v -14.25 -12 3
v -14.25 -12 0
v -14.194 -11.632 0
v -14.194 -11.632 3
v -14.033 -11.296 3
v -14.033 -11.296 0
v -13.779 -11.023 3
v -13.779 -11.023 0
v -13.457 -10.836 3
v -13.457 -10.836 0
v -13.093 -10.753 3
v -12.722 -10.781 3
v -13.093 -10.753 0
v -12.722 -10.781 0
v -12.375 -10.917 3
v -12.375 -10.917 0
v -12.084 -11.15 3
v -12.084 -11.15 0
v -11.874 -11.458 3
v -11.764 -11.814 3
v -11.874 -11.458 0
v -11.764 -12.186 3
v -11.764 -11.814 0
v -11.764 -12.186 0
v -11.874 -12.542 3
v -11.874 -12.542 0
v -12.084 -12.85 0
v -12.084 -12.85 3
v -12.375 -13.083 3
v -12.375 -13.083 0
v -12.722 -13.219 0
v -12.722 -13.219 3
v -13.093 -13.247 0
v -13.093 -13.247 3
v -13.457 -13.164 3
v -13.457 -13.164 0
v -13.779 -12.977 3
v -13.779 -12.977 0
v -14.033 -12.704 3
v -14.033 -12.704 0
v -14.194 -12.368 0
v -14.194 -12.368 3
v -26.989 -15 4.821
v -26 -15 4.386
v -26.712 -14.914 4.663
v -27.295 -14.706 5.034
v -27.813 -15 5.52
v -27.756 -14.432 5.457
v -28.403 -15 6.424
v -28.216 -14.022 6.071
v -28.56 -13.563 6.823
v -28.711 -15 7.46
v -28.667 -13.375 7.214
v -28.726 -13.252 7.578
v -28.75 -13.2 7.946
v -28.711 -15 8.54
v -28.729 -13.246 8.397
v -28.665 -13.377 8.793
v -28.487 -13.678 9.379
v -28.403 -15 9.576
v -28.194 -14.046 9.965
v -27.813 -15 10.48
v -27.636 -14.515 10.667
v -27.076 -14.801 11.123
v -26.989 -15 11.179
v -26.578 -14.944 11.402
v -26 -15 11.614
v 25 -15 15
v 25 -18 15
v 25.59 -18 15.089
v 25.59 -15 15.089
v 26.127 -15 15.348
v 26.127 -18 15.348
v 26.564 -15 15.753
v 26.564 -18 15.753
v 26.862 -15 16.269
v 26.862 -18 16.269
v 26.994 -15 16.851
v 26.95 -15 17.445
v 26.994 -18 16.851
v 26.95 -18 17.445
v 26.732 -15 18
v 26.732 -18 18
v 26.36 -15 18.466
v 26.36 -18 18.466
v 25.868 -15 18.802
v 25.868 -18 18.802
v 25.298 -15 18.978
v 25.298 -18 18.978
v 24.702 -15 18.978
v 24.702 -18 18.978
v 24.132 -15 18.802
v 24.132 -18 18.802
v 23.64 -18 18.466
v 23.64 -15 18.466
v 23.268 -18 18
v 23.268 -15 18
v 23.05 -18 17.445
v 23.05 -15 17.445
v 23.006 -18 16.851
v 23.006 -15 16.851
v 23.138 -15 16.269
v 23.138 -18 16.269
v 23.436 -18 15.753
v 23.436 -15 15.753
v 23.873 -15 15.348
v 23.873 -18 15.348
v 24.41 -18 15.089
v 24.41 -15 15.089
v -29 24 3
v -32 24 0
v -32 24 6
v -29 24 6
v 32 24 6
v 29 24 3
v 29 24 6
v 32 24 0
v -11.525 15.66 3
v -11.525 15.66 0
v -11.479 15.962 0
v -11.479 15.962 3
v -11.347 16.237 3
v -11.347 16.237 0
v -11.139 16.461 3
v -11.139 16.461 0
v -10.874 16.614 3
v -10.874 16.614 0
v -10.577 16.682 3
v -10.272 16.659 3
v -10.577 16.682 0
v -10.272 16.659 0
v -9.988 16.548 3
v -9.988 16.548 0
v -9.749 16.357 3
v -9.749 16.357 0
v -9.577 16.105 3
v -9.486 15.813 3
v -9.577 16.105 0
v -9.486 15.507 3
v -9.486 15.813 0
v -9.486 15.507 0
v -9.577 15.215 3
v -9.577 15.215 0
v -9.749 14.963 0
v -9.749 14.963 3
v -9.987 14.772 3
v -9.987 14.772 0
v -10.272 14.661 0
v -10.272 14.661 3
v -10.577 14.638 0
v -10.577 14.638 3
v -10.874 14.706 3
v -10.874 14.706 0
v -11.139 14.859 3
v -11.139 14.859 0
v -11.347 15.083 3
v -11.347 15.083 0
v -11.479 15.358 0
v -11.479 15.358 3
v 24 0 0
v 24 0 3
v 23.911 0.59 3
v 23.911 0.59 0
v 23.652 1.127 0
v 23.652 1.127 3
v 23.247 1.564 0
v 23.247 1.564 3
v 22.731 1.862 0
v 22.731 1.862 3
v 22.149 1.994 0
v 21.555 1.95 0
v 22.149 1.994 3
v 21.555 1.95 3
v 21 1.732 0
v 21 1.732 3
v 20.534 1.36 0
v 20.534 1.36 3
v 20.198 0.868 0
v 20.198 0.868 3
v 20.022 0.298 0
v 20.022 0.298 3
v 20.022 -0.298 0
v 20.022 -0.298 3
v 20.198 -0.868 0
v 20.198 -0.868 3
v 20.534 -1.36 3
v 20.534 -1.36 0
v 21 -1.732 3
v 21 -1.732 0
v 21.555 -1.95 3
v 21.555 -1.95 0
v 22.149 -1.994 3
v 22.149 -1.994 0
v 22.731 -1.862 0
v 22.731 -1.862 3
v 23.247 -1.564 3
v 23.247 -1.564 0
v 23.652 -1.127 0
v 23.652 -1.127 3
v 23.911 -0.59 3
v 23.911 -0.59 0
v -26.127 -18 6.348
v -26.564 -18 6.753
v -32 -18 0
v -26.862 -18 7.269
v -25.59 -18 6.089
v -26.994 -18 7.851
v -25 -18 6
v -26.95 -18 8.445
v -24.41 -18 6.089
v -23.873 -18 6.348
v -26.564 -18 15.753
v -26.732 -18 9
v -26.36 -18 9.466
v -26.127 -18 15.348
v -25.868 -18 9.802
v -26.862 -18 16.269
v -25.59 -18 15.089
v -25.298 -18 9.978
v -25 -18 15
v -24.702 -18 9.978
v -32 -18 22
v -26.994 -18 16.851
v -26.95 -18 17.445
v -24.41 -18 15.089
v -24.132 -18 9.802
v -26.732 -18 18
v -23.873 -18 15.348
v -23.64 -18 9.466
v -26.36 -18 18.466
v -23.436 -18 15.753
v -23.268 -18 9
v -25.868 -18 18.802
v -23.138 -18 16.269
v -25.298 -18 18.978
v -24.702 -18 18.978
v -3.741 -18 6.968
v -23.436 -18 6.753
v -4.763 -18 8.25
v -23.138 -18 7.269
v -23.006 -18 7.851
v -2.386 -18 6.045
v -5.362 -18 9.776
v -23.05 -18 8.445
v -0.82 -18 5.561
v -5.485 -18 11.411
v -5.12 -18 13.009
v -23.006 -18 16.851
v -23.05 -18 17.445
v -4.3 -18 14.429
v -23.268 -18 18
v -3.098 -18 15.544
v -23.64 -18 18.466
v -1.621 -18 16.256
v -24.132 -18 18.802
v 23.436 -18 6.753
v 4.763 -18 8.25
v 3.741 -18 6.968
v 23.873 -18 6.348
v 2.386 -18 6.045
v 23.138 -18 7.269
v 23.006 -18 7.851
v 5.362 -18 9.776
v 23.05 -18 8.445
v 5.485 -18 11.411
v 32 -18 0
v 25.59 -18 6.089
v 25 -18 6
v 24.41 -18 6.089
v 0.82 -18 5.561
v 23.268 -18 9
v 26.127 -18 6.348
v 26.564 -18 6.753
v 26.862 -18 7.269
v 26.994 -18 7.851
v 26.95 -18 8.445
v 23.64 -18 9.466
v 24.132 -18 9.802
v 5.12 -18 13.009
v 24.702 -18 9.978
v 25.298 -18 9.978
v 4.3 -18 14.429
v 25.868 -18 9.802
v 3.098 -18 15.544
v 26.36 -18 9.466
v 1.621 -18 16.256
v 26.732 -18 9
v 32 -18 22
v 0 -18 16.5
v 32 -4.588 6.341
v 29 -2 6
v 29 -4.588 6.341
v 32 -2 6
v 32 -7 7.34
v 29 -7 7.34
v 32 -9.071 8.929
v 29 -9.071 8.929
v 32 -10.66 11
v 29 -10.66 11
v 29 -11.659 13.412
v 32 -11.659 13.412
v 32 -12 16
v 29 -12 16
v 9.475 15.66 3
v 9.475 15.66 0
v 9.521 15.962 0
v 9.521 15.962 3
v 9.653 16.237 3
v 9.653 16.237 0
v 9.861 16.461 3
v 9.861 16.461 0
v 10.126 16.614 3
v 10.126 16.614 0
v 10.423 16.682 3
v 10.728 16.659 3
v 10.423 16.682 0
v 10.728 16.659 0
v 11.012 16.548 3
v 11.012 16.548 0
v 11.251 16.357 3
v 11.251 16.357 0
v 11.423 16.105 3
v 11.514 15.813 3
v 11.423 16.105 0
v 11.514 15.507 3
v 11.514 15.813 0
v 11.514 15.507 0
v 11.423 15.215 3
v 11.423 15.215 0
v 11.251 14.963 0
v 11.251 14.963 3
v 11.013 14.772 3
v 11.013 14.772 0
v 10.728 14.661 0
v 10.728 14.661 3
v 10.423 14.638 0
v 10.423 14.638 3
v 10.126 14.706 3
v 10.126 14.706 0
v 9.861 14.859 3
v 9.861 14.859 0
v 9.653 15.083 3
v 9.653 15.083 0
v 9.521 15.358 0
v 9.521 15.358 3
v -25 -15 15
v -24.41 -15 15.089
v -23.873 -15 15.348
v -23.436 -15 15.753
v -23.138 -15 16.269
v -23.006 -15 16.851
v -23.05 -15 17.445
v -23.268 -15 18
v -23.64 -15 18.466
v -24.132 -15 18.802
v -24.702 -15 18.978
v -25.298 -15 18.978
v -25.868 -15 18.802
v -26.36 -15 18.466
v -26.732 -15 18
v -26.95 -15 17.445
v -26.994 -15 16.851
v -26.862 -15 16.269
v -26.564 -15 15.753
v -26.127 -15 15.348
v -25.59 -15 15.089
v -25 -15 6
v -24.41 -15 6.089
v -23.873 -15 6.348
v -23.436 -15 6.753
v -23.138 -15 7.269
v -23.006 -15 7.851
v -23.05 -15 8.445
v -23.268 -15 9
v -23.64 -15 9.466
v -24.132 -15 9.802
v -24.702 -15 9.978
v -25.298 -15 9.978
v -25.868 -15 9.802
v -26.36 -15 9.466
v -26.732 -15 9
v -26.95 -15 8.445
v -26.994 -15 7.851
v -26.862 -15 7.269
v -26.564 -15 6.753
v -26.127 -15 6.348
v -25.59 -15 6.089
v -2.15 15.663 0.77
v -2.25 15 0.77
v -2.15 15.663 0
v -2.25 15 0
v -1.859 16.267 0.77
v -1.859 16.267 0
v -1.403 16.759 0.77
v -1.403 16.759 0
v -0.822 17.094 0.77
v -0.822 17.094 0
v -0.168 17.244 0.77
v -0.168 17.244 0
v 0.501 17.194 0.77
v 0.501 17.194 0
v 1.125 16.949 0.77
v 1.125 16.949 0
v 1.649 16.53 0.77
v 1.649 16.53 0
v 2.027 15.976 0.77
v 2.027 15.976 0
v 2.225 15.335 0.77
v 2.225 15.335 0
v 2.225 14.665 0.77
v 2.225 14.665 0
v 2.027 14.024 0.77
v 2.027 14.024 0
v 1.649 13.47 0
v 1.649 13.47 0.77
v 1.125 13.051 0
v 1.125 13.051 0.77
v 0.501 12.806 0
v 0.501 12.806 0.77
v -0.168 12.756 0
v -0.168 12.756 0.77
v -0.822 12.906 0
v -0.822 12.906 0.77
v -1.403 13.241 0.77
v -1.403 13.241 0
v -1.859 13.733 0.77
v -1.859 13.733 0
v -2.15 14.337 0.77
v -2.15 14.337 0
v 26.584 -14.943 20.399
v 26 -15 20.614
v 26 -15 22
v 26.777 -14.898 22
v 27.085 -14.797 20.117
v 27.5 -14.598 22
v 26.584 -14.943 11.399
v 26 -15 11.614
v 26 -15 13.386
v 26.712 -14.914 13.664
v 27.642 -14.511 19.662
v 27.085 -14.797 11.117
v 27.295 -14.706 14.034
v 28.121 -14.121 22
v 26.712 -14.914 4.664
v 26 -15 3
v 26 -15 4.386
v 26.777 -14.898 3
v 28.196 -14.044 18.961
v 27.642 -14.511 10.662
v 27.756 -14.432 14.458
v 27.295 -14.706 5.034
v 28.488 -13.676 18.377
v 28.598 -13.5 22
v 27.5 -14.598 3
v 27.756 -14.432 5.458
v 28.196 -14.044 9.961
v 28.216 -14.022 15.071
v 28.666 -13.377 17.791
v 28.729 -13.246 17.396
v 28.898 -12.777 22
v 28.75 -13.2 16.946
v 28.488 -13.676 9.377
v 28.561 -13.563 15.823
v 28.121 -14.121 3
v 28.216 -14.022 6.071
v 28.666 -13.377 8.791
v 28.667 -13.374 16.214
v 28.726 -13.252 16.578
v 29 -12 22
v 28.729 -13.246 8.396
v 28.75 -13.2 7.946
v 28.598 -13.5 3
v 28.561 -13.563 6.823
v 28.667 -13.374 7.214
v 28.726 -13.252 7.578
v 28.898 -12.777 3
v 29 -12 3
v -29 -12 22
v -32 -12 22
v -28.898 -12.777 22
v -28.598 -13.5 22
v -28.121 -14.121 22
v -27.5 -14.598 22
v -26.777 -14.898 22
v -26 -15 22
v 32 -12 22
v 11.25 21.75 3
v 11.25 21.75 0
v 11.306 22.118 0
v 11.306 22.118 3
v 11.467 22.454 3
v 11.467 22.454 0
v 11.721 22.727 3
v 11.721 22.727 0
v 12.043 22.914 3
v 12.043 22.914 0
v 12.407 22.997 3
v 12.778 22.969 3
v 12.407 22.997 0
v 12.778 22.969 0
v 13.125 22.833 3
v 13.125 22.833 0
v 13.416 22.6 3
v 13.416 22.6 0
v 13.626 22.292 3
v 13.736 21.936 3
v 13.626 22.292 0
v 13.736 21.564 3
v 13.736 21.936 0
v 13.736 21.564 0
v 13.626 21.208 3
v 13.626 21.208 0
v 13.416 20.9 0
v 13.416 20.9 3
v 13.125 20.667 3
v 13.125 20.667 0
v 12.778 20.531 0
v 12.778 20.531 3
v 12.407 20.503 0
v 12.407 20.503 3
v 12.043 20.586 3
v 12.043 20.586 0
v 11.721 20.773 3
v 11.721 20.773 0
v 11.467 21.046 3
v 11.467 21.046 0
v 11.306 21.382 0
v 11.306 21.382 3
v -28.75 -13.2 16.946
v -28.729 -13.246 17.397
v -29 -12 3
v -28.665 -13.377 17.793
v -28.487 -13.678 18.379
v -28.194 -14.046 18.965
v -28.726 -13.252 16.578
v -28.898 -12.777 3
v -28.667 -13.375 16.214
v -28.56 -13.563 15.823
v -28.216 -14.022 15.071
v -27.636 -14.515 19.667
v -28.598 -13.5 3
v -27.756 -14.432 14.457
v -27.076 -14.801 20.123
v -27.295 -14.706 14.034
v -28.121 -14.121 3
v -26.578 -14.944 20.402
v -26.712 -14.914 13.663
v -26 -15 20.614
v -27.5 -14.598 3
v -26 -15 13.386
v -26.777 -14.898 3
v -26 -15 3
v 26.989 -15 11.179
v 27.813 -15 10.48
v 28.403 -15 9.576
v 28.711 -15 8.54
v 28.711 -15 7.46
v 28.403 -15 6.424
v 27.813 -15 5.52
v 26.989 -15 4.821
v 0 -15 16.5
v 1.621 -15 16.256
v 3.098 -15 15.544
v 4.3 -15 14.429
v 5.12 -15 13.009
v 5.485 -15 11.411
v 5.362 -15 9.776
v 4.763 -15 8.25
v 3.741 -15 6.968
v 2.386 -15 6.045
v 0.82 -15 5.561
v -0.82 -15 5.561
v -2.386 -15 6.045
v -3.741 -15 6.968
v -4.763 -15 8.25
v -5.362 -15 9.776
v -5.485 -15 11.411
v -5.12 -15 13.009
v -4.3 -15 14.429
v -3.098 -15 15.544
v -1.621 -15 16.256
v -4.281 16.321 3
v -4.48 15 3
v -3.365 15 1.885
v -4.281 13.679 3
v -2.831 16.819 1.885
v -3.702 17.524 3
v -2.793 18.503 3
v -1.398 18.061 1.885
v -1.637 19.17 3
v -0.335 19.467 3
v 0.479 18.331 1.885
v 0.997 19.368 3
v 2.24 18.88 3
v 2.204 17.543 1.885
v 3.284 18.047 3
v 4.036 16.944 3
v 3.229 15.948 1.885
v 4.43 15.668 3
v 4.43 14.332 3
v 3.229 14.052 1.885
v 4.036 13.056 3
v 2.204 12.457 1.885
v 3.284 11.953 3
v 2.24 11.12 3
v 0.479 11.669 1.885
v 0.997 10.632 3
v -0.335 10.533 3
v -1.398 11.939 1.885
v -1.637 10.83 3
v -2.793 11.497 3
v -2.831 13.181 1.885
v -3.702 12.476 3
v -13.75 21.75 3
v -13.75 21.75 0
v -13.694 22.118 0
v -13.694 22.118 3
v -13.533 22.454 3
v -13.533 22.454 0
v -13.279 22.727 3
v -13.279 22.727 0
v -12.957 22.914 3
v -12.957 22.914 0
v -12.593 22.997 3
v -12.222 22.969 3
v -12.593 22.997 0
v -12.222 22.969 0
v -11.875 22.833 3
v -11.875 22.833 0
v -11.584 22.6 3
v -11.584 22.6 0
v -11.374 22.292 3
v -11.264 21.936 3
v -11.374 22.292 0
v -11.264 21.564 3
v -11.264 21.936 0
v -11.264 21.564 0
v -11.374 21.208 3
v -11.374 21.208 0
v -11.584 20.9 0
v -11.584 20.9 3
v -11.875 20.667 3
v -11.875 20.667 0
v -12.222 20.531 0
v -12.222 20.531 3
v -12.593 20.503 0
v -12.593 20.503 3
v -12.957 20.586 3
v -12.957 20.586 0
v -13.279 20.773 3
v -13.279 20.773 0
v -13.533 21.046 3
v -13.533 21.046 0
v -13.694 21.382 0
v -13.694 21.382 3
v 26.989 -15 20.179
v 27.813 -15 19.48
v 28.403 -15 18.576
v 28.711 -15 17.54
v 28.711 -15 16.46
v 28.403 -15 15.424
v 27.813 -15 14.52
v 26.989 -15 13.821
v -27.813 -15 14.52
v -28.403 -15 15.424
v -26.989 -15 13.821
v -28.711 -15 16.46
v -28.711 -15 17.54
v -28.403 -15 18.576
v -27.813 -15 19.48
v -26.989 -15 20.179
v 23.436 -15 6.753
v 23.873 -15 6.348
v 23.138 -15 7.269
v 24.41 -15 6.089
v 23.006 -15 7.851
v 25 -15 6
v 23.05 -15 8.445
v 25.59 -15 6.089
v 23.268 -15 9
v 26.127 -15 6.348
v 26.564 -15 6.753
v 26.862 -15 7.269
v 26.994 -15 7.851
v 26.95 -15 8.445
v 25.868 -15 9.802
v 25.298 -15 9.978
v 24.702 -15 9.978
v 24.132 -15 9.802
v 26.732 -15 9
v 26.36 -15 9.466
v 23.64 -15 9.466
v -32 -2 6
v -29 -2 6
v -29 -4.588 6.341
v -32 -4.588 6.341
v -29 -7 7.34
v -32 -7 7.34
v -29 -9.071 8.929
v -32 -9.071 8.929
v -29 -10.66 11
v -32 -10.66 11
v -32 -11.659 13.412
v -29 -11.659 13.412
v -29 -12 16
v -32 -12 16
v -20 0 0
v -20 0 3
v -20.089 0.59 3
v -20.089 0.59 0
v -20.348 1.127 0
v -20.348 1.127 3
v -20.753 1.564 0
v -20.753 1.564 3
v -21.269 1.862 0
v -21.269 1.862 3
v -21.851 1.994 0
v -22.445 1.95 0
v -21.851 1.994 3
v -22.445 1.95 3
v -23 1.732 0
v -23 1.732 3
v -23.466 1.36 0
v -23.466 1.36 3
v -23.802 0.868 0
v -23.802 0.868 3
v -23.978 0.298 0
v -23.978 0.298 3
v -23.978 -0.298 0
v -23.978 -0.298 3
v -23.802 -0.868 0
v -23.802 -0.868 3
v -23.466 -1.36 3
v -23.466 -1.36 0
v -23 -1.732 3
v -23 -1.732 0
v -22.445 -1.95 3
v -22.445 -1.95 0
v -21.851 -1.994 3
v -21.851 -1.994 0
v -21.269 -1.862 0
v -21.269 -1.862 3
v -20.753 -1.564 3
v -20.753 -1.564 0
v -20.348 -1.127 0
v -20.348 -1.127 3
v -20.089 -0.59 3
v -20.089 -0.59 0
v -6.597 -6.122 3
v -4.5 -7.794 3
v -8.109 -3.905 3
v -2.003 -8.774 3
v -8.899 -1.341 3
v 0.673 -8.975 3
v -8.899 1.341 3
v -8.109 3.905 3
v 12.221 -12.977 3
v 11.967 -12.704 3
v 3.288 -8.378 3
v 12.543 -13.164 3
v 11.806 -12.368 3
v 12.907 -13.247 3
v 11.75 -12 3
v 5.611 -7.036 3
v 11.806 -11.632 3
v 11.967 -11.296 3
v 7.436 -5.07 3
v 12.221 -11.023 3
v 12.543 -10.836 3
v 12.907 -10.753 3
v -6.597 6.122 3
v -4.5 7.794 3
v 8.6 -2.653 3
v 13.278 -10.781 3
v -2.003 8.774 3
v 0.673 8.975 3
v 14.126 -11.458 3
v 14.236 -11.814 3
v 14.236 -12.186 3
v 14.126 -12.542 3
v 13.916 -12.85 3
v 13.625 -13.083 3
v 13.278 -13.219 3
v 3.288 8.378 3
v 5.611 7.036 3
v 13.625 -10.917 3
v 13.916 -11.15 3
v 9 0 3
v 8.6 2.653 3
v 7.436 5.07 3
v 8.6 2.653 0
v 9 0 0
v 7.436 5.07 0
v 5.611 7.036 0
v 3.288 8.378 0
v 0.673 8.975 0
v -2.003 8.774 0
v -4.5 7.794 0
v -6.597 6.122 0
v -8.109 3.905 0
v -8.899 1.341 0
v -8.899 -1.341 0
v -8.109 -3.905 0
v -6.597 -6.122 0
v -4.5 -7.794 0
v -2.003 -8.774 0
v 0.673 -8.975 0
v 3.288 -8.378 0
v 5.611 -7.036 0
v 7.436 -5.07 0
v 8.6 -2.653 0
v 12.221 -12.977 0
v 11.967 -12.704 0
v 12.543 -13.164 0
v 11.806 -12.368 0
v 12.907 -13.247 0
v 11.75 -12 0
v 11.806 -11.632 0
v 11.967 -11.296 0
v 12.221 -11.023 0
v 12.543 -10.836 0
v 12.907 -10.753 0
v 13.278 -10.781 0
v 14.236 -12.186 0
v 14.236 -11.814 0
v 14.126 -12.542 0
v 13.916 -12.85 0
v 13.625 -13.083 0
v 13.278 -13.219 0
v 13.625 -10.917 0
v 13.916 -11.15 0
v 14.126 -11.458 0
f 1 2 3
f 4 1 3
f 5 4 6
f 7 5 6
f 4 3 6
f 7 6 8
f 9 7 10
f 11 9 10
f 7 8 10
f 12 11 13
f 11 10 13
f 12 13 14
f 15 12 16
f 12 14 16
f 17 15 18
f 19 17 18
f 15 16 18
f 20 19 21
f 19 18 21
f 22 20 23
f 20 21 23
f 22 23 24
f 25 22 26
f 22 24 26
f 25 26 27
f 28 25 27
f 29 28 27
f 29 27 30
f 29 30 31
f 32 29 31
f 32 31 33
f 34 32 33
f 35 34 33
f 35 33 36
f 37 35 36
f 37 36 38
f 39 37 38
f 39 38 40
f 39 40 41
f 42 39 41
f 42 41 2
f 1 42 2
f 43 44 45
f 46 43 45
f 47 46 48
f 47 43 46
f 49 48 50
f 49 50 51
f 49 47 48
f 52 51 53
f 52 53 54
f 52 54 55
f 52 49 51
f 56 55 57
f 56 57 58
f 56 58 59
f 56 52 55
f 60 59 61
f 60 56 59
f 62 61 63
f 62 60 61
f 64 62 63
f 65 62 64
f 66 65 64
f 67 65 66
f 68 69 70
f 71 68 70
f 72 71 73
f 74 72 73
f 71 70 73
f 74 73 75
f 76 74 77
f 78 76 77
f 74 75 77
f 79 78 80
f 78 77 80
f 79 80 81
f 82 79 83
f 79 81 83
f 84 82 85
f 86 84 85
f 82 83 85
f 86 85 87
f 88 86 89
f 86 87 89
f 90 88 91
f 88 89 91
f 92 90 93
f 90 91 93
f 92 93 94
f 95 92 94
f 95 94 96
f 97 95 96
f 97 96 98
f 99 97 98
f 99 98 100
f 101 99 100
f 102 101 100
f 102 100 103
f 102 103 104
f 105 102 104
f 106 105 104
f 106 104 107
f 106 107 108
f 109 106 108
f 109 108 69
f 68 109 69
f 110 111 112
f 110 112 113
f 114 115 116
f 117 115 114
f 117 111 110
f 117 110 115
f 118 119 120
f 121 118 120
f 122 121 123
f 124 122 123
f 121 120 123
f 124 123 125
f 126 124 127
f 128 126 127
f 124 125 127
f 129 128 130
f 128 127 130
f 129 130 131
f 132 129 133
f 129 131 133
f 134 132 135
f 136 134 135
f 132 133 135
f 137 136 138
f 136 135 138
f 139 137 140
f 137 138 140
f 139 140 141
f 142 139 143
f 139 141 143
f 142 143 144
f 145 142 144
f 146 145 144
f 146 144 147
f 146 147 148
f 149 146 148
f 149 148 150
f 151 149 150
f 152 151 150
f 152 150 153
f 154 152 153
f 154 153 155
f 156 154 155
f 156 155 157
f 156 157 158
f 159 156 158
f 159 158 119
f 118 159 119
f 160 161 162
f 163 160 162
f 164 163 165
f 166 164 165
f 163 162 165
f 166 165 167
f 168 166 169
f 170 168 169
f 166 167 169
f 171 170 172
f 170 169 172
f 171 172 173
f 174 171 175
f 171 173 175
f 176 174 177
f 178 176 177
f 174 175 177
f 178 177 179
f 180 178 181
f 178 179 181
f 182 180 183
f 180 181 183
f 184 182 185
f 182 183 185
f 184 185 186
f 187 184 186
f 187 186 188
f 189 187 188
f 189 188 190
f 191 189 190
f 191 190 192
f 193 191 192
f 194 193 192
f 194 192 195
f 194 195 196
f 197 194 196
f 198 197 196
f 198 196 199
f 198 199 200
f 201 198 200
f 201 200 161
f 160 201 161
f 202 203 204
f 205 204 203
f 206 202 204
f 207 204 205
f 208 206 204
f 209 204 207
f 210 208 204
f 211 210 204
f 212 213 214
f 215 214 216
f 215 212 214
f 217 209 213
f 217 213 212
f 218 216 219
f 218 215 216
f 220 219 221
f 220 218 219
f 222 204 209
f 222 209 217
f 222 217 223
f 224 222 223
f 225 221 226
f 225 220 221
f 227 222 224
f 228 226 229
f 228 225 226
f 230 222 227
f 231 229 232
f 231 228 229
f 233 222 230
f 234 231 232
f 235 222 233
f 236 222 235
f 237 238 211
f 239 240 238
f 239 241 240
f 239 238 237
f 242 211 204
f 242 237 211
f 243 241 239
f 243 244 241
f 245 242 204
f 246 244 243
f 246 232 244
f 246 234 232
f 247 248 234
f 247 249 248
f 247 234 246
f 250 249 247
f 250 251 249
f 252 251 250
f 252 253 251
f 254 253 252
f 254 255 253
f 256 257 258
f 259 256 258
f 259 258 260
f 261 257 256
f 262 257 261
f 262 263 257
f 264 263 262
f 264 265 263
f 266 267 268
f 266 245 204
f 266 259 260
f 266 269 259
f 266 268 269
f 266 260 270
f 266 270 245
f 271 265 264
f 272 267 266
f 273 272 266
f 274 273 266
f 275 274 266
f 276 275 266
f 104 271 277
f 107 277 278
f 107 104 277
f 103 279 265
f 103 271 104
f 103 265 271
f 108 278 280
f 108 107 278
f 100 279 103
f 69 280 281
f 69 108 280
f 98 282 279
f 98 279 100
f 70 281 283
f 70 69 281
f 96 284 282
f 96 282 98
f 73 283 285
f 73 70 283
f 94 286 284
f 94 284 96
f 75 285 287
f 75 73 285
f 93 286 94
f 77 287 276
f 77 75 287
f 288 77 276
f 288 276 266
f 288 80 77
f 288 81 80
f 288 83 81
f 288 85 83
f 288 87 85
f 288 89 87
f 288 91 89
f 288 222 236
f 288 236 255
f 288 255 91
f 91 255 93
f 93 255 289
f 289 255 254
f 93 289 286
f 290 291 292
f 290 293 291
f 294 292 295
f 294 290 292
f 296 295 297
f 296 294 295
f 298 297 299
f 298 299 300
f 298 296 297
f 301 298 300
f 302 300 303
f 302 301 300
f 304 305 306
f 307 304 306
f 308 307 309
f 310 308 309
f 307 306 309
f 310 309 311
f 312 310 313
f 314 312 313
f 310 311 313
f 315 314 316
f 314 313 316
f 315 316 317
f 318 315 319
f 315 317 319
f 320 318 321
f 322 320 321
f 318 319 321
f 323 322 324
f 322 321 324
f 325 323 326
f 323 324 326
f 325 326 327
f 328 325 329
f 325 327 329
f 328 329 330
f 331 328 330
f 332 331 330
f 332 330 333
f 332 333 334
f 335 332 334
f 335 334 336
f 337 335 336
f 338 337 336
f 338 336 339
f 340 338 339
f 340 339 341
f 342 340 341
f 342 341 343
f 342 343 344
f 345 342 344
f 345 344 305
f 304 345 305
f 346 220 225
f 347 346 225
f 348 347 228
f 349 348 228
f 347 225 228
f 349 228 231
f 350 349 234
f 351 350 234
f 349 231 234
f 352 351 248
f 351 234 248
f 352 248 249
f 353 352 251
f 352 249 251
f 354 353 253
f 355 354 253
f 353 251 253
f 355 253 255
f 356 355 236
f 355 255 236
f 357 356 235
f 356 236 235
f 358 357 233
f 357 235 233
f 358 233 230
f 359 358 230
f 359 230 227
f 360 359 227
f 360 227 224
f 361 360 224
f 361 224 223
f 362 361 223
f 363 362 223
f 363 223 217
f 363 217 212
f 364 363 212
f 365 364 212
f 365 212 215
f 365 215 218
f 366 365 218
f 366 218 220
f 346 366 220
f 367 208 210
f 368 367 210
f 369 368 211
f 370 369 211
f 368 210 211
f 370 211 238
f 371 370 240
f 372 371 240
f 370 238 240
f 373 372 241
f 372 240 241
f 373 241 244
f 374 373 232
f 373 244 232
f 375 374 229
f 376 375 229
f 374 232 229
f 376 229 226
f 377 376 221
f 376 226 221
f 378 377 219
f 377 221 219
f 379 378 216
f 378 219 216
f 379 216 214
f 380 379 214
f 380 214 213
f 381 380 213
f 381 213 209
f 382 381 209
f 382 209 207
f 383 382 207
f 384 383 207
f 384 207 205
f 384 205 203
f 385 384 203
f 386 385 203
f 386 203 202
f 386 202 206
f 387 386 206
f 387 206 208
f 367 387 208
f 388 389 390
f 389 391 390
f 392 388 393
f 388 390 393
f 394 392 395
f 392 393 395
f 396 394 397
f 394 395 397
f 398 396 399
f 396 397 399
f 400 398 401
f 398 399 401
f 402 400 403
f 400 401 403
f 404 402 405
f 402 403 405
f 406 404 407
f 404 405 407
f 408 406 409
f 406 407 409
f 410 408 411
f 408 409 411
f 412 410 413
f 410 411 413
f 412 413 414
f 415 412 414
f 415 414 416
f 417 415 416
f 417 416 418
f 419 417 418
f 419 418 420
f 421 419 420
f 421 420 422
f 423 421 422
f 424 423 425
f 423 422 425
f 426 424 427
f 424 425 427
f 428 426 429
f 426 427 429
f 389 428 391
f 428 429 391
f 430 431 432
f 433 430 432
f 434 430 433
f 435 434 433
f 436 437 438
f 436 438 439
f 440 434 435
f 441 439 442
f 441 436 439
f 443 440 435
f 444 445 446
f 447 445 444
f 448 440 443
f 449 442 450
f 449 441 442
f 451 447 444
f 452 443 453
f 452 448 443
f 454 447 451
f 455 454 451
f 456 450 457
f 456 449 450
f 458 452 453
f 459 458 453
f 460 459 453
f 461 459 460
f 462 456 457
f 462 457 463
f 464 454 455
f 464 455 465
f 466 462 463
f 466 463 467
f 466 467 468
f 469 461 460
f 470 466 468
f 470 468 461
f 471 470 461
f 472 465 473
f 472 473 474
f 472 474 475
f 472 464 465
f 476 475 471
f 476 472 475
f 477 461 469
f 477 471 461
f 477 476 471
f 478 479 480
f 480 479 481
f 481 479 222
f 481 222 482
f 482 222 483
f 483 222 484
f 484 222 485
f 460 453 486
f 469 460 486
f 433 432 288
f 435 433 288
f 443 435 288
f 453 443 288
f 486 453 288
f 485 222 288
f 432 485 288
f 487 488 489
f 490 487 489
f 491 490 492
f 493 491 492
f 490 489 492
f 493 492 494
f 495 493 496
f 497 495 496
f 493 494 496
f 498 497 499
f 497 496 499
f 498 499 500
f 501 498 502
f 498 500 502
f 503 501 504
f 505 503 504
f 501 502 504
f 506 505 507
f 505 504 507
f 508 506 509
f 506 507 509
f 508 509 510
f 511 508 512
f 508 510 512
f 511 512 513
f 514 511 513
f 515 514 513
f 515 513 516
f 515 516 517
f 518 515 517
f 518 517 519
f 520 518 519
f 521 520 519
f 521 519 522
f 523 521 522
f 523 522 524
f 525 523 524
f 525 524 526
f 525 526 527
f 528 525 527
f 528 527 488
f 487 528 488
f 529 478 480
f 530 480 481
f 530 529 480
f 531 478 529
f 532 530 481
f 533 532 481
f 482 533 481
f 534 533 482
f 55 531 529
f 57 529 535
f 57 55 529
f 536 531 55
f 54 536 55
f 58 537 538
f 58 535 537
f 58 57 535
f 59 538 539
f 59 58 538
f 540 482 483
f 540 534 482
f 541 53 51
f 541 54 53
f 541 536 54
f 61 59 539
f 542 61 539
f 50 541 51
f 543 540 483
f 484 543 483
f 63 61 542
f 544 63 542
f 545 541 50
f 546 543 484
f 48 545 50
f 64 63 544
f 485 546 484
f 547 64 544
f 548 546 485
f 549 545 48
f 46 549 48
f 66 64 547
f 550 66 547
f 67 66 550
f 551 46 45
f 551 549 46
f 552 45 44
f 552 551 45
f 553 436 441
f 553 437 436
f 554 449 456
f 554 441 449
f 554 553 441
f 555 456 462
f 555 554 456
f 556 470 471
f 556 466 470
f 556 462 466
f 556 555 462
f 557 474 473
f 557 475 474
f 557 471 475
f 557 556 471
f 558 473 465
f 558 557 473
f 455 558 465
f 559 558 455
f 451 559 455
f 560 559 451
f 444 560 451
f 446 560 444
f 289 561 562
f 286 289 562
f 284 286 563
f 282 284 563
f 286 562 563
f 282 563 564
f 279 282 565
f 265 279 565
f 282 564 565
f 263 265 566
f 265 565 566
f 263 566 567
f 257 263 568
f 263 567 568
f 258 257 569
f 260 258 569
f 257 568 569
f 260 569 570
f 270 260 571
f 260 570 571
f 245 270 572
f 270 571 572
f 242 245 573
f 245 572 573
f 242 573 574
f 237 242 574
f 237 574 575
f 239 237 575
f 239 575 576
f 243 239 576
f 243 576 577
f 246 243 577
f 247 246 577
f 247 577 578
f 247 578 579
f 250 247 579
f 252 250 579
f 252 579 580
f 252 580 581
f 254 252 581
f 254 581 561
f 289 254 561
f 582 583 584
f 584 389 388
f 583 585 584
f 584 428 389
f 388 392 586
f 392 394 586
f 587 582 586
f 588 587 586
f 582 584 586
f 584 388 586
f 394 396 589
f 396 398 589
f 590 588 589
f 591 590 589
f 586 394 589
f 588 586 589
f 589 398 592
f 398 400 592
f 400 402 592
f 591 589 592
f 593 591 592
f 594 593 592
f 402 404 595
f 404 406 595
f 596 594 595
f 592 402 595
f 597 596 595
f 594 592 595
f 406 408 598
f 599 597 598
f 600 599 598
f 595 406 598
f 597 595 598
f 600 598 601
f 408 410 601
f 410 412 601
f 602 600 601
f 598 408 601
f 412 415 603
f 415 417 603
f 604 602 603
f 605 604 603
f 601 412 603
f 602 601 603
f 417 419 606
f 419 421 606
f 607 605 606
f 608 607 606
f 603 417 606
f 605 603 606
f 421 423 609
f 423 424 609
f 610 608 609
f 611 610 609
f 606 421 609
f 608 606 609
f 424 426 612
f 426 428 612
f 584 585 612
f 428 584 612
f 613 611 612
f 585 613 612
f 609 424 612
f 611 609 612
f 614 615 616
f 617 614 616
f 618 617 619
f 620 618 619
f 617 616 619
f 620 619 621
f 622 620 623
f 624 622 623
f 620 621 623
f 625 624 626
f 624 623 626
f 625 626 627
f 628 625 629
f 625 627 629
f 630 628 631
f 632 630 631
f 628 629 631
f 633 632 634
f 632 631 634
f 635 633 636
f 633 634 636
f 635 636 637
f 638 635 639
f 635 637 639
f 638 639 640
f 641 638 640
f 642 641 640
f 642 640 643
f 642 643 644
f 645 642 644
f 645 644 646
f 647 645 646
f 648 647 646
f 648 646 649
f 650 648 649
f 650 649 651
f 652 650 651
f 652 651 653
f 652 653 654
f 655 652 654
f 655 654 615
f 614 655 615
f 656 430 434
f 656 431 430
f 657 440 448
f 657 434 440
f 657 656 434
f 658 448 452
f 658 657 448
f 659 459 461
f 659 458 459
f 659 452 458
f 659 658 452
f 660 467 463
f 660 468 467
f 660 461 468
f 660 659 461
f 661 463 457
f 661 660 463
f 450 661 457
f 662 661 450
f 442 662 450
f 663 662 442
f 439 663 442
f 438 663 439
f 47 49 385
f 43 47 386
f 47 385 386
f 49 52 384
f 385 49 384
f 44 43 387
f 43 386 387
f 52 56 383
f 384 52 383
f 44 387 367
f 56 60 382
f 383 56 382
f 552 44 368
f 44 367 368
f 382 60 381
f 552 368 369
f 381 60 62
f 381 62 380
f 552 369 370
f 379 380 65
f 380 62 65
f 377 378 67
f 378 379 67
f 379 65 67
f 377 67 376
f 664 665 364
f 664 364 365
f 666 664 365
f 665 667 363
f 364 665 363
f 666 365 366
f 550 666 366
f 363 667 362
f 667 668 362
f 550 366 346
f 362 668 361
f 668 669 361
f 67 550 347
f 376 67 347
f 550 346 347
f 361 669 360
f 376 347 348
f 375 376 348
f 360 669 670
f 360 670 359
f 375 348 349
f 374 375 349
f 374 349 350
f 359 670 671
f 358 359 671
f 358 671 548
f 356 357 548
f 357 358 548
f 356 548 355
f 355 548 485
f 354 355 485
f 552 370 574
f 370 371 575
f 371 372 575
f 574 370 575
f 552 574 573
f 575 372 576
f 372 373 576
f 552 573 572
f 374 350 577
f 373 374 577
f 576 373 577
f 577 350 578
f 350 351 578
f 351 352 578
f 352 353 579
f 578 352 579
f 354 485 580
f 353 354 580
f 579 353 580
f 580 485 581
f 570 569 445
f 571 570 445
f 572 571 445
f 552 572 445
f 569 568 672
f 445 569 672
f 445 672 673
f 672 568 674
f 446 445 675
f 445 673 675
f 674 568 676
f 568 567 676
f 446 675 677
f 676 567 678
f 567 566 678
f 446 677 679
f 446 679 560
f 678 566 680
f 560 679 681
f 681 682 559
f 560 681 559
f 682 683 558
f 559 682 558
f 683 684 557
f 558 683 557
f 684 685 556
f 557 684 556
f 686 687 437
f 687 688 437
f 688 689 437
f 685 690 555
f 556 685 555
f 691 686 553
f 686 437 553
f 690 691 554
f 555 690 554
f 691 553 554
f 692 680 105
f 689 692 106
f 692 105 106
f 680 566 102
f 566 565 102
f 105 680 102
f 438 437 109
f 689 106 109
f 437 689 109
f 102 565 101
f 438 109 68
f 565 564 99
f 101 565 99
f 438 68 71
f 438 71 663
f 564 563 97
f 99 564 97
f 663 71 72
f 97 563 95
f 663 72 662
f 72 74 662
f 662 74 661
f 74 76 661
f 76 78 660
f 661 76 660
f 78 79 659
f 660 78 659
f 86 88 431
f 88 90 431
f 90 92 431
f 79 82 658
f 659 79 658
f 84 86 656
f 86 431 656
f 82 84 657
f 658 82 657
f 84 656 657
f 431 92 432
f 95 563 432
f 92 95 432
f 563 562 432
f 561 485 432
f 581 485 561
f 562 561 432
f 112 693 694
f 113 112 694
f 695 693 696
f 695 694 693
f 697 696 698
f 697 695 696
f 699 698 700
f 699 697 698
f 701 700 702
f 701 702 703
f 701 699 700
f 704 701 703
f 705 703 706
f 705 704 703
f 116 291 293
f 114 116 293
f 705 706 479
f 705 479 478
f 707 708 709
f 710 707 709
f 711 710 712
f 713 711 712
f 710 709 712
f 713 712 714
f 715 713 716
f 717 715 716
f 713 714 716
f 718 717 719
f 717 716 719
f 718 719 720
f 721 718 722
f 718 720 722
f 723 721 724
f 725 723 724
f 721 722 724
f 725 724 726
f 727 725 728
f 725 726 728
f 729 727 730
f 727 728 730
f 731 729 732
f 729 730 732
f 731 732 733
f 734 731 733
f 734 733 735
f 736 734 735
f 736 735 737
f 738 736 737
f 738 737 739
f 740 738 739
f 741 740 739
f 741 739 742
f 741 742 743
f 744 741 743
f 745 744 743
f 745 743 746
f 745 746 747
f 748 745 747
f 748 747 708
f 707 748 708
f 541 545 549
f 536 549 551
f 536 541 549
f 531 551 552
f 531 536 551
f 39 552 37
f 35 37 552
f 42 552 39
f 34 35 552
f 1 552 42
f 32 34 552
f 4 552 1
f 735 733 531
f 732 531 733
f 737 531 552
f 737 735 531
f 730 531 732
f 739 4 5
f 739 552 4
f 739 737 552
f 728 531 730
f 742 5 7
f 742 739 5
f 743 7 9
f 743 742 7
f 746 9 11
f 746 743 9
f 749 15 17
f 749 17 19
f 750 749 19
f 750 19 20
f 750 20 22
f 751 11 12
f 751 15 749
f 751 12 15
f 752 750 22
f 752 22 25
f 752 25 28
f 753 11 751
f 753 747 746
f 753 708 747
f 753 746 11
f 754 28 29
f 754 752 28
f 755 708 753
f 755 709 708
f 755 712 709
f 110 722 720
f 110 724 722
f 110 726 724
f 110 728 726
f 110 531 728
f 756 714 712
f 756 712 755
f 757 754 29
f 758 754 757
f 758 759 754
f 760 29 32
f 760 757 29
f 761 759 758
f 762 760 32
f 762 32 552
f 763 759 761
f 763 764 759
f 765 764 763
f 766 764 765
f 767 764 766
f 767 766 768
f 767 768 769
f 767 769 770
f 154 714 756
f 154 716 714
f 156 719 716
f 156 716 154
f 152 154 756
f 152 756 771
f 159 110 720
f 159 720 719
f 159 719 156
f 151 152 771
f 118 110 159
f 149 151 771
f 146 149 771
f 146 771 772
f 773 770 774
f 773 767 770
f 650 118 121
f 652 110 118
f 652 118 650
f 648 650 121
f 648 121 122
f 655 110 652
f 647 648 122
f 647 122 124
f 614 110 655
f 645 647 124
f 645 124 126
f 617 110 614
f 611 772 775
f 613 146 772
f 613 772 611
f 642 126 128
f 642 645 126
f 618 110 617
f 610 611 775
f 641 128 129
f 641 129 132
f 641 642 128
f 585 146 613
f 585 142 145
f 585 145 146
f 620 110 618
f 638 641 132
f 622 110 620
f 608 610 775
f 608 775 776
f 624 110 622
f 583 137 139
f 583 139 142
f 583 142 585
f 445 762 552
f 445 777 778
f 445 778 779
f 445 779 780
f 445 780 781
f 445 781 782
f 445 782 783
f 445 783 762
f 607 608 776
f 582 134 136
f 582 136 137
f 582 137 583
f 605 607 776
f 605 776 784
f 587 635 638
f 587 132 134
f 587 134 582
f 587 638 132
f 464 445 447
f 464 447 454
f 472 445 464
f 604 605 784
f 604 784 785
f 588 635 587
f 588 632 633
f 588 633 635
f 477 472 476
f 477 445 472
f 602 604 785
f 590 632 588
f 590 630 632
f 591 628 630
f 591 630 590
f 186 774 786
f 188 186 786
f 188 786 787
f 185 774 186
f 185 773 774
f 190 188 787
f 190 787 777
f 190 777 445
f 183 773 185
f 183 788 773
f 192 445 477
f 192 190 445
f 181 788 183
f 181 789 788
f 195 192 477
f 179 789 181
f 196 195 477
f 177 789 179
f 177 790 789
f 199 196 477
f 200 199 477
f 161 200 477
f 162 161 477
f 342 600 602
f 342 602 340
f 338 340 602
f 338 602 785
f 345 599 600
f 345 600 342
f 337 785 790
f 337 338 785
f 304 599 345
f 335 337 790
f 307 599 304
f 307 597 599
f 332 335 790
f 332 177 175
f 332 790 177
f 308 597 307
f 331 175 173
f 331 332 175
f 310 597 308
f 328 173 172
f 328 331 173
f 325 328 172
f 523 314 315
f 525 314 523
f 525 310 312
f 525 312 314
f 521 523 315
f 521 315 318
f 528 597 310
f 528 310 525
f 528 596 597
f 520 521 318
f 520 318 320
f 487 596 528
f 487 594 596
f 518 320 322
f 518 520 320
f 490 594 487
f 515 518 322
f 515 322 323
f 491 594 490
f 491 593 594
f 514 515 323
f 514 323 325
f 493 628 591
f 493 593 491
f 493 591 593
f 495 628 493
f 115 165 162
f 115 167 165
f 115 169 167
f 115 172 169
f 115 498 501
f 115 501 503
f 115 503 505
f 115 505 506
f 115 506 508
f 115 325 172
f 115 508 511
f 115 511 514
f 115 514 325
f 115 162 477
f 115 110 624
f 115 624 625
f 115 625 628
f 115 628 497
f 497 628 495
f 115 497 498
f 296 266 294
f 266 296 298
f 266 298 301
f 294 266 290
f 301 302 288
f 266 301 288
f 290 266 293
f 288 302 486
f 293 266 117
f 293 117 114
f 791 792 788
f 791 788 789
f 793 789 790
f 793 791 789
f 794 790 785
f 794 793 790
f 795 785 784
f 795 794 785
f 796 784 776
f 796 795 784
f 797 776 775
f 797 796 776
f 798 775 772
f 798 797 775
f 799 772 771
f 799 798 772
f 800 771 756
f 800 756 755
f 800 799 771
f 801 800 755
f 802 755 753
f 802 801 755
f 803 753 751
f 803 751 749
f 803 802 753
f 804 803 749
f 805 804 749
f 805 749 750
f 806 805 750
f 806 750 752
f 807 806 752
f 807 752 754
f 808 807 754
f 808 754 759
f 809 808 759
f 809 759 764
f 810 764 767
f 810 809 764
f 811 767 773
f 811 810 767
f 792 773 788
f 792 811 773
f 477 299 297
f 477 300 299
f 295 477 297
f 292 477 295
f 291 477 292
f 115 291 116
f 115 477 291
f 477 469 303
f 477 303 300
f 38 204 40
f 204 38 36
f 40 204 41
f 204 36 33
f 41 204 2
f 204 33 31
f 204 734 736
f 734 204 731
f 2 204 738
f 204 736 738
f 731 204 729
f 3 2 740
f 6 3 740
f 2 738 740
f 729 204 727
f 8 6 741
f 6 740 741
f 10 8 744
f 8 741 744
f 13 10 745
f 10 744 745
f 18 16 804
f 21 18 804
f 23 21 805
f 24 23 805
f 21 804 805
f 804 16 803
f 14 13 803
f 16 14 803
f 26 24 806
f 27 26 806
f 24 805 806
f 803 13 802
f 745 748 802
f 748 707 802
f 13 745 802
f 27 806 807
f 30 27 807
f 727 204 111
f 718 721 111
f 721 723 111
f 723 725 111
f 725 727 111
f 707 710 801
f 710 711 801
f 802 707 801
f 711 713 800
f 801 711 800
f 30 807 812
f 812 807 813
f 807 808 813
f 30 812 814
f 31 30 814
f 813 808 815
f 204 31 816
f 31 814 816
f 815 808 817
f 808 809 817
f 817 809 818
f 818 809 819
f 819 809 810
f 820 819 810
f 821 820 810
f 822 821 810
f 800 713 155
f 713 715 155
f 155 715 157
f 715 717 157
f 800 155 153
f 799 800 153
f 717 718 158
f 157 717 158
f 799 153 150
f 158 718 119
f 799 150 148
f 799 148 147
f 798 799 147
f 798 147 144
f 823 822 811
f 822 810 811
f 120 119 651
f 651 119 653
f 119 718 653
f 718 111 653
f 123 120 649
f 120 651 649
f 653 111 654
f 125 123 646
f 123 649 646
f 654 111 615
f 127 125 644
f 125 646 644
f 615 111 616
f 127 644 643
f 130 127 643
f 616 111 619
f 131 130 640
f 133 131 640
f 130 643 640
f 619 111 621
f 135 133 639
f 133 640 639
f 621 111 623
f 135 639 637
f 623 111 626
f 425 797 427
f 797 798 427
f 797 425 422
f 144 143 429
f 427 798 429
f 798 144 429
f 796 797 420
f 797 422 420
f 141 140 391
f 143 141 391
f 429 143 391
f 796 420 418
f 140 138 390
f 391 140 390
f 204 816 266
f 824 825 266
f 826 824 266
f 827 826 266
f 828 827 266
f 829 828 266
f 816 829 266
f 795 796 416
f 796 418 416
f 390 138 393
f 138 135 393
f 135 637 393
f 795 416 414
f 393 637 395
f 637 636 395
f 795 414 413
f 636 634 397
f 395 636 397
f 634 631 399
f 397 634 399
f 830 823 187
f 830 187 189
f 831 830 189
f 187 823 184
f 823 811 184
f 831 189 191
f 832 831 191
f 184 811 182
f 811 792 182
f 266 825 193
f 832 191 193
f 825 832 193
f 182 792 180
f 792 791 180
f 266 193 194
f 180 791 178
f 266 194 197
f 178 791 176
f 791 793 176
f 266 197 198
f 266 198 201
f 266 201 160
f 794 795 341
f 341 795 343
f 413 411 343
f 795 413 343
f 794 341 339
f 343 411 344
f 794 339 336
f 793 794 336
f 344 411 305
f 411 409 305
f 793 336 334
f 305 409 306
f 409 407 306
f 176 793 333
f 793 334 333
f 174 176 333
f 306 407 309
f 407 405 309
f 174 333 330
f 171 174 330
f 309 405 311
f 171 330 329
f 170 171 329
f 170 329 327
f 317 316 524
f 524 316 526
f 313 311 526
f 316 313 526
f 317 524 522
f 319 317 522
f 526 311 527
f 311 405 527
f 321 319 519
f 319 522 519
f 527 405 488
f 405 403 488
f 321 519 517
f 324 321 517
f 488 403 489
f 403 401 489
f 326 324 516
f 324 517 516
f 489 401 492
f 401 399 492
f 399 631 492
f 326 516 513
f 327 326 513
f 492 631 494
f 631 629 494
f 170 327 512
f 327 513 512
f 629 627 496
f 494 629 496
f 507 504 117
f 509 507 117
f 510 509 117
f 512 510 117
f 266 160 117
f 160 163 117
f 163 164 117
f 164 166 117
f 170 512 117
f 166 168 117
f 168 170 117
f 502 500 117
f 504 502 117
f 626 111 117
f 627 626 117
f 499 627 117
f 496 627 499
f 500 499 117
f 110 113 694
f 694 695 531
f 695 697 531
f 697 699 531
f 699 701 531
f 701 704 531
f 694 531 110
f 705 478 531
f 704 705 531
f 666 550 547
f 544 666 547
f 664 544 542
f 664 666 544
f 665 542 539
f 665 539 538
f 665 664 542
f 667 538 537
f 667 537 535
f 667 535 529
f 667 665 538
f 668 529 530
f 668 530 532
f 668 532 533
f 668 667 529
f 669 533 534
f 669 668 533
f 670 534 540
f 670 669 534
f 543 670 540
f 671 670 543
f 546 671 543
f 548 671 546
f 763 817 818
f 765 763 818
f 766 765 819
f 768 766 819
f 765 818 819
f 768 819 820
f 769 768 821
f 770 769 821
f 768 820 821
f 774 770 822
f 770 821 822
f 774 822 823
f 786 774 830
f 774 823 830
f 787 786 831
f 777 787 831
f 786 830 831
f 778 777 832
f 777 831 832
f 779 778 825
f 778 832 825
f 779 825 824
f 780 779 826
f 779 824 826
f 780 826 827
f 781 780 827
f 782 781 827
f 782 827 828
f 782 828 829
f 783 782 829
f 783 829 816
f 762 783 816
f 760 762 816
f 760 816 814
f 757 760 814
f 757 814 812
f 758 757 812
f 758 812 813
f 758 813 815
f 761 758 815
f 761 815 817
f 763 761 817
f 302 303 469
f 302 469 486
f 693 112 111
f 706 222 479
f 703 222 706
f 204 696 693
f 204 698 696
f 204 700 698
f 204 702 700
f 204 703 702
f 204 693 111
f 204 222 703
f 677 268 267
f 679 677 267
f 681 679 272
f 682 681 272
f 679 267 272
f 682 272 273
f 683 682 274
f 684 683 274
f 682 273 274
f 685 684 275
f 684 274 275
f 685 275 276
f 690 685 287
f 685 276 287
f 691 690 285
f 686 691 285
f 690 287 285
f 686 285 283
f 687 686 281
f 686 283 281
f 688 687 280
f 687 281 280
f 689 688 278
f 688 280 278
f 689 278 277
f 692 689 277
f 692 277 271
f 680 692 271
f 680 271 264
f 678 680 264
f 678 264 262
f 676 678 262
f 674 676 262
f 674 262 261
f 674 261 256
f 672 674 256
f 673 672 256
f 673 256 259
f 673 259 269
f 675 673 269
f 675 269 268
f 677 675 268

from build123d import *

# Parameters (mm, degrees)
SKETCH1_W                                            = 64
SKETCH1_H                                            = 39
SKETCH1_R                                            = 9
BOSS_EXTRUDE1_DEPTH                                  = 3
SKETCH2_W                                            = 3
SKETCH2_H                                            = 39
BOSS_EXTRUDE2_DEPTH                                  = 3
SKETCH3_W                                            = 64
SKETCH3_H                                            = 22
BOSS_EXTRUDE3_DEPTH                                  = 3
SKETCH4_W                                            = 3
SKETCH4_H                                            = 16
BOSS_EXTRUDE4_DEPTH                                  = 3
FILLET1_R                                            = 10
F_4_0_4_DIAMETER_HOLE1_D                             = 4
F_4_0_4_DIAMETER_HOLE1_DEPTH                         = 15
F_4_0_4_DIAMETER_HOLE1_TIP                           = 1.201721238
CSK_FOR_M4_HEX_SOCKET_COUNTERSUNK_CAP_SC_D           = 4.5
CSK_FOR_M4_HEX_SOCKET_COUNTERSUNK_CAP_SC_DEPTH       = 10
CSK_FOR_M4_HEX_SOCKET_COUNTERSUNK_CAP_SC_CSINK_D     = 8.96
CSK_FOR_M4_HEX_SOCKET_COUNTERSUNK_CAP_SC_CSINK_ANGLE = 90
CSK_FOR_M4_HEX_SOCKET_COUNTERSUNK_CAP_SC_TIP         = 1.351936393
M2_5_TAPPED_HOLE1_D                                  = 2.05
M2_5_TAPPED_HOLE1_DEPTH                              = 7.25
M2_5_TAPPED_HOLE1_TIP                                = 0.615882135
M3_TAPPED_HOLE1_D                                    = 2.5
M3_TAPPED_HOLE1_DEPTH                                = 8.5
M3_TAPPED_HOLE1_TIP                                  = 0.751075774
FILLET4_R                                            = 3
SKETCH19_R                                           = 2
CUT_EXTRUDE1_DEPTH                                   = 10
SKETCH20_R                                           = 5.5
CUT_EXTRUDE2_DEPTH                                   = 10
SKETCH21_R                                           = 3.75
CUT_EXTRUDE3_DEPTH                                   = 10


with BuildPart() as part:
    # Sketch1 → Boss-Extrude1 (new body)
    with BuildSketch(Plane.XY):
        with Locations((0, 4.5)):
            Rectangle(SKETCH1_W, SKETCH1_H)
        Circle(SKETCH1_R, mode=Mode.SUBTRACT)
    extrude(amount=BOSS_EXTRUDE1_DEPTH)

    # Sketch2 → Boss-Extrude2 (add)
    with BuildSketch(Plane.XY.offset(3)):
        with Locations((-30.5, 4.5)):
            Rectangle(SKETCH2_W, SKETCH2_H)
        with Locations((30.5, 4.5)):
            Rectangle(SKETCH2_W, SKETCH2_H)
    extrude(amount=BOSS_EXTRUDE2_DEPTH)

    # Sketch3 → Boss-Extrude3 (add)
    with BuildSketch(Plane.XZ.offset(15)):
        with Locations((0, 11)):
            Rectangle(SKETCH3_W, SKETCH3_H)
    extrude(amount=BOSS_EXTRUDE3_DEPTH)

    # Sketch4 → Boss-Extrude4 (add)
    with BuildSketch(Plane(origin=(0, -15, 0), x_dir=(1, 0, 0), z_dir=(0, 1, 0))):
        with Locations((-30.5, -14)):
            Rectangle(SKETCH4_W, SKETCH4_H)
        with Locations((30.5, -14)):
            Rectangle(SKETCH4_W, SKETCH4_H)
    extrude(amount=BOSS_EXTRUDE4_DEPTH)

    # Fillet1
    fillet1_edges = [part.edges().sort_by_distance(p)[0] for p in [
        (-30.5, -12, 6),
        (30.5, -12, 6),
    ]]
    fillet(fillet1_edges, radius=FILLET1_R)

    # Ø4.0 (4) Diameter Hole1
    with Locations(Plane(origin=(0, 0, 0), x_dir=(-1, 0, 0), z_dir=(0, 0, -1))):
        with Locations((-22, 0), (22, 0)):
            Hole(F_4_0_4_DIAMETER_HOLE1_D / 2, depth=F_4_0_4_DIAMETER_HOLE1_DEPTH)
            with Locations((0, 0, -(F_4_0_4_DIAMETER_HOLE1_DEPTH + F_4_0_4_DIAMETER_HOLE1_TIP / 2))):  # 118° drill point
                Cone(0, F_4_0_4_DIAMETER_HOLE1_D / 2, F_4_0_4_DIAMETER_HOLE1_TIP, mode=Mode.SUBTRACT)

    # CSK for M4 Hex Socket Countersunk Cap Screw1
    with Locations(Plane.XY.offset(3)):
        with Locations((0, 15)):
            CounterSinkHole(CSK_FOR_M4_HEX_SOCKET_COUNTERSUNK_CAP_SC_D / 2, CSK_FOR_M4_HEX_SOCKET_COUNTERSUNK_CAP_SC_CSINK_D / 2, depth=CSK_FOR_M4_HEX_SOCKET_COUNTERSUNK_CAP_SC_DEPTH, counter_sink_angle=CSK_FOR_M4_HEX_SOCKET_COUNTERSUNK_CAP_SC_CSINK_ANGLE)
            with Locations((0, 0, -(CSK_FOR_M4_HEX_SOCKET_COUNTERSUNK_CAP_SC_DEPTH + CSK_FOR_M4_HEX_SOCKET_COUNTERSUNK_CAP_SC_TIP / 2))):  # 118° drill point
                Cone(0, CSK_FOR_M4_HEX_SOCKET_COUNTERSUNK_CAP_SC_D / 2, CSK_FOR_M4_HEX_SOCKET_COUNTERSUNK_CAP_SC_TIP, mode=Mode.SUBTRACT)

    # M2.5 Tapped Hole1
    with Locations(Plane.XY.offset(3)):
        with Locations((-10.5, 15.66), (10.5, 15.66)):
            Hole(M2_5_TAPPED_HOLE1_D / 2, depth=M2_5_TAPPED_HOLE1_DEPTH)
            with Locations((0, 0, -(M2_5_TAPPED_HOLE1_DEPTH + M2_5_TAPPED_HOLE1_TIP / 2))):  # 118° drill point
                Cone(0, M2_5_TAPPED_HOLE1_D / 2, M2_5_TAPPED_HOLE1_TIP, mode=Mode.SUBTRACT)

    # M3 Tapped Hole1
    with Locations(Plane.XY.offset(3)):
        with Locations((-12.5, 21.75), (12.5, 21.75), (13, -12), (-13, -12)):
            Hole(M3_TAPPED_HOLE1_D / 2, depth=M3_TAPPED_HOLE1_DEPTH)
            with Locations((0, 0, -(M3_TAPPED_HOLE1_DEPTH + M3_TAPPED_HOLE1_TIP / 2))):  # 118° drill point
                Cone(0, M3_TAPPED_HOLE1_D / 2, M3_TAPPED_HOLE1_TIP, mode=Mode.SUBTRACT)

    # Fillet4
    fillet4_edges = [part.edges().sort_by_distance(p)[0] for p in [
        (29, -15, 12.5),
        (-29, -15, 12.5),
    ]]
    fillet(fillet4_edges, radius=FILLET4_R - 0.0001)  # a hair under: the kernel refuses the full size

    # Sketch19 → Cut-Extrude1 (cut)
    with BuildSketch(Plane.XZ.offset(18)):
        with Locations(Location((-25, 8, 0), (0, 0, 270))):
            Circle(SKETCH19_R)
        with Locations(Location((25, 8, 0), (0, 0, 270))):
            Circle(SKETCH19_R)
        with Locations(Location((-25, 17, 0), (0, 0, 270))):
            Circle(SKETCH19_R)
        with Locations(Location((25, 17, 0), (0, 0, 270))):
            Circle(SKETCH19_R)
    extrude(amount=-CUT_EXTRUDE1_DEPTH, mode=Mode.SUBTRACT)

    # Sketch20 → Cut-Extrude2 (cut)
    with BuildSketch(Plane(origin=(0, -15, 0), x_dir=(1, 0, 0), z_dir=(0, 1, 0))):
        with Locations(Location((0, -11, 0), (0, 0, 270))):
            Circle(SKETCH20_R)
    extrude(amount=-CUT_EXTRUDE2_DEPTH, mode=Mode.SUBTRACT)

    # Sketch21 → Cut-Extrude3 (cut)
    with BuildSketch(Plane(origin=(0, -15, 0), x_dir=(1, 0, 0), z_dir=(0, 1, 0))):
        with Locations((-25, -8)):
            Circle(SKETCH21_R)
        with Locations((-25, -17)):
            Circle(SKETCH21_R)
        with Locations((25, -8)):
            Circle(SKETCH21_R)
        with Locations((25, -17)):
            Circle(SKETCH21_R)
    extrude(amount=CUT_EXTRUDE3_DEPTH, mode=Mode.SUBTRACT)


solid = part.part
